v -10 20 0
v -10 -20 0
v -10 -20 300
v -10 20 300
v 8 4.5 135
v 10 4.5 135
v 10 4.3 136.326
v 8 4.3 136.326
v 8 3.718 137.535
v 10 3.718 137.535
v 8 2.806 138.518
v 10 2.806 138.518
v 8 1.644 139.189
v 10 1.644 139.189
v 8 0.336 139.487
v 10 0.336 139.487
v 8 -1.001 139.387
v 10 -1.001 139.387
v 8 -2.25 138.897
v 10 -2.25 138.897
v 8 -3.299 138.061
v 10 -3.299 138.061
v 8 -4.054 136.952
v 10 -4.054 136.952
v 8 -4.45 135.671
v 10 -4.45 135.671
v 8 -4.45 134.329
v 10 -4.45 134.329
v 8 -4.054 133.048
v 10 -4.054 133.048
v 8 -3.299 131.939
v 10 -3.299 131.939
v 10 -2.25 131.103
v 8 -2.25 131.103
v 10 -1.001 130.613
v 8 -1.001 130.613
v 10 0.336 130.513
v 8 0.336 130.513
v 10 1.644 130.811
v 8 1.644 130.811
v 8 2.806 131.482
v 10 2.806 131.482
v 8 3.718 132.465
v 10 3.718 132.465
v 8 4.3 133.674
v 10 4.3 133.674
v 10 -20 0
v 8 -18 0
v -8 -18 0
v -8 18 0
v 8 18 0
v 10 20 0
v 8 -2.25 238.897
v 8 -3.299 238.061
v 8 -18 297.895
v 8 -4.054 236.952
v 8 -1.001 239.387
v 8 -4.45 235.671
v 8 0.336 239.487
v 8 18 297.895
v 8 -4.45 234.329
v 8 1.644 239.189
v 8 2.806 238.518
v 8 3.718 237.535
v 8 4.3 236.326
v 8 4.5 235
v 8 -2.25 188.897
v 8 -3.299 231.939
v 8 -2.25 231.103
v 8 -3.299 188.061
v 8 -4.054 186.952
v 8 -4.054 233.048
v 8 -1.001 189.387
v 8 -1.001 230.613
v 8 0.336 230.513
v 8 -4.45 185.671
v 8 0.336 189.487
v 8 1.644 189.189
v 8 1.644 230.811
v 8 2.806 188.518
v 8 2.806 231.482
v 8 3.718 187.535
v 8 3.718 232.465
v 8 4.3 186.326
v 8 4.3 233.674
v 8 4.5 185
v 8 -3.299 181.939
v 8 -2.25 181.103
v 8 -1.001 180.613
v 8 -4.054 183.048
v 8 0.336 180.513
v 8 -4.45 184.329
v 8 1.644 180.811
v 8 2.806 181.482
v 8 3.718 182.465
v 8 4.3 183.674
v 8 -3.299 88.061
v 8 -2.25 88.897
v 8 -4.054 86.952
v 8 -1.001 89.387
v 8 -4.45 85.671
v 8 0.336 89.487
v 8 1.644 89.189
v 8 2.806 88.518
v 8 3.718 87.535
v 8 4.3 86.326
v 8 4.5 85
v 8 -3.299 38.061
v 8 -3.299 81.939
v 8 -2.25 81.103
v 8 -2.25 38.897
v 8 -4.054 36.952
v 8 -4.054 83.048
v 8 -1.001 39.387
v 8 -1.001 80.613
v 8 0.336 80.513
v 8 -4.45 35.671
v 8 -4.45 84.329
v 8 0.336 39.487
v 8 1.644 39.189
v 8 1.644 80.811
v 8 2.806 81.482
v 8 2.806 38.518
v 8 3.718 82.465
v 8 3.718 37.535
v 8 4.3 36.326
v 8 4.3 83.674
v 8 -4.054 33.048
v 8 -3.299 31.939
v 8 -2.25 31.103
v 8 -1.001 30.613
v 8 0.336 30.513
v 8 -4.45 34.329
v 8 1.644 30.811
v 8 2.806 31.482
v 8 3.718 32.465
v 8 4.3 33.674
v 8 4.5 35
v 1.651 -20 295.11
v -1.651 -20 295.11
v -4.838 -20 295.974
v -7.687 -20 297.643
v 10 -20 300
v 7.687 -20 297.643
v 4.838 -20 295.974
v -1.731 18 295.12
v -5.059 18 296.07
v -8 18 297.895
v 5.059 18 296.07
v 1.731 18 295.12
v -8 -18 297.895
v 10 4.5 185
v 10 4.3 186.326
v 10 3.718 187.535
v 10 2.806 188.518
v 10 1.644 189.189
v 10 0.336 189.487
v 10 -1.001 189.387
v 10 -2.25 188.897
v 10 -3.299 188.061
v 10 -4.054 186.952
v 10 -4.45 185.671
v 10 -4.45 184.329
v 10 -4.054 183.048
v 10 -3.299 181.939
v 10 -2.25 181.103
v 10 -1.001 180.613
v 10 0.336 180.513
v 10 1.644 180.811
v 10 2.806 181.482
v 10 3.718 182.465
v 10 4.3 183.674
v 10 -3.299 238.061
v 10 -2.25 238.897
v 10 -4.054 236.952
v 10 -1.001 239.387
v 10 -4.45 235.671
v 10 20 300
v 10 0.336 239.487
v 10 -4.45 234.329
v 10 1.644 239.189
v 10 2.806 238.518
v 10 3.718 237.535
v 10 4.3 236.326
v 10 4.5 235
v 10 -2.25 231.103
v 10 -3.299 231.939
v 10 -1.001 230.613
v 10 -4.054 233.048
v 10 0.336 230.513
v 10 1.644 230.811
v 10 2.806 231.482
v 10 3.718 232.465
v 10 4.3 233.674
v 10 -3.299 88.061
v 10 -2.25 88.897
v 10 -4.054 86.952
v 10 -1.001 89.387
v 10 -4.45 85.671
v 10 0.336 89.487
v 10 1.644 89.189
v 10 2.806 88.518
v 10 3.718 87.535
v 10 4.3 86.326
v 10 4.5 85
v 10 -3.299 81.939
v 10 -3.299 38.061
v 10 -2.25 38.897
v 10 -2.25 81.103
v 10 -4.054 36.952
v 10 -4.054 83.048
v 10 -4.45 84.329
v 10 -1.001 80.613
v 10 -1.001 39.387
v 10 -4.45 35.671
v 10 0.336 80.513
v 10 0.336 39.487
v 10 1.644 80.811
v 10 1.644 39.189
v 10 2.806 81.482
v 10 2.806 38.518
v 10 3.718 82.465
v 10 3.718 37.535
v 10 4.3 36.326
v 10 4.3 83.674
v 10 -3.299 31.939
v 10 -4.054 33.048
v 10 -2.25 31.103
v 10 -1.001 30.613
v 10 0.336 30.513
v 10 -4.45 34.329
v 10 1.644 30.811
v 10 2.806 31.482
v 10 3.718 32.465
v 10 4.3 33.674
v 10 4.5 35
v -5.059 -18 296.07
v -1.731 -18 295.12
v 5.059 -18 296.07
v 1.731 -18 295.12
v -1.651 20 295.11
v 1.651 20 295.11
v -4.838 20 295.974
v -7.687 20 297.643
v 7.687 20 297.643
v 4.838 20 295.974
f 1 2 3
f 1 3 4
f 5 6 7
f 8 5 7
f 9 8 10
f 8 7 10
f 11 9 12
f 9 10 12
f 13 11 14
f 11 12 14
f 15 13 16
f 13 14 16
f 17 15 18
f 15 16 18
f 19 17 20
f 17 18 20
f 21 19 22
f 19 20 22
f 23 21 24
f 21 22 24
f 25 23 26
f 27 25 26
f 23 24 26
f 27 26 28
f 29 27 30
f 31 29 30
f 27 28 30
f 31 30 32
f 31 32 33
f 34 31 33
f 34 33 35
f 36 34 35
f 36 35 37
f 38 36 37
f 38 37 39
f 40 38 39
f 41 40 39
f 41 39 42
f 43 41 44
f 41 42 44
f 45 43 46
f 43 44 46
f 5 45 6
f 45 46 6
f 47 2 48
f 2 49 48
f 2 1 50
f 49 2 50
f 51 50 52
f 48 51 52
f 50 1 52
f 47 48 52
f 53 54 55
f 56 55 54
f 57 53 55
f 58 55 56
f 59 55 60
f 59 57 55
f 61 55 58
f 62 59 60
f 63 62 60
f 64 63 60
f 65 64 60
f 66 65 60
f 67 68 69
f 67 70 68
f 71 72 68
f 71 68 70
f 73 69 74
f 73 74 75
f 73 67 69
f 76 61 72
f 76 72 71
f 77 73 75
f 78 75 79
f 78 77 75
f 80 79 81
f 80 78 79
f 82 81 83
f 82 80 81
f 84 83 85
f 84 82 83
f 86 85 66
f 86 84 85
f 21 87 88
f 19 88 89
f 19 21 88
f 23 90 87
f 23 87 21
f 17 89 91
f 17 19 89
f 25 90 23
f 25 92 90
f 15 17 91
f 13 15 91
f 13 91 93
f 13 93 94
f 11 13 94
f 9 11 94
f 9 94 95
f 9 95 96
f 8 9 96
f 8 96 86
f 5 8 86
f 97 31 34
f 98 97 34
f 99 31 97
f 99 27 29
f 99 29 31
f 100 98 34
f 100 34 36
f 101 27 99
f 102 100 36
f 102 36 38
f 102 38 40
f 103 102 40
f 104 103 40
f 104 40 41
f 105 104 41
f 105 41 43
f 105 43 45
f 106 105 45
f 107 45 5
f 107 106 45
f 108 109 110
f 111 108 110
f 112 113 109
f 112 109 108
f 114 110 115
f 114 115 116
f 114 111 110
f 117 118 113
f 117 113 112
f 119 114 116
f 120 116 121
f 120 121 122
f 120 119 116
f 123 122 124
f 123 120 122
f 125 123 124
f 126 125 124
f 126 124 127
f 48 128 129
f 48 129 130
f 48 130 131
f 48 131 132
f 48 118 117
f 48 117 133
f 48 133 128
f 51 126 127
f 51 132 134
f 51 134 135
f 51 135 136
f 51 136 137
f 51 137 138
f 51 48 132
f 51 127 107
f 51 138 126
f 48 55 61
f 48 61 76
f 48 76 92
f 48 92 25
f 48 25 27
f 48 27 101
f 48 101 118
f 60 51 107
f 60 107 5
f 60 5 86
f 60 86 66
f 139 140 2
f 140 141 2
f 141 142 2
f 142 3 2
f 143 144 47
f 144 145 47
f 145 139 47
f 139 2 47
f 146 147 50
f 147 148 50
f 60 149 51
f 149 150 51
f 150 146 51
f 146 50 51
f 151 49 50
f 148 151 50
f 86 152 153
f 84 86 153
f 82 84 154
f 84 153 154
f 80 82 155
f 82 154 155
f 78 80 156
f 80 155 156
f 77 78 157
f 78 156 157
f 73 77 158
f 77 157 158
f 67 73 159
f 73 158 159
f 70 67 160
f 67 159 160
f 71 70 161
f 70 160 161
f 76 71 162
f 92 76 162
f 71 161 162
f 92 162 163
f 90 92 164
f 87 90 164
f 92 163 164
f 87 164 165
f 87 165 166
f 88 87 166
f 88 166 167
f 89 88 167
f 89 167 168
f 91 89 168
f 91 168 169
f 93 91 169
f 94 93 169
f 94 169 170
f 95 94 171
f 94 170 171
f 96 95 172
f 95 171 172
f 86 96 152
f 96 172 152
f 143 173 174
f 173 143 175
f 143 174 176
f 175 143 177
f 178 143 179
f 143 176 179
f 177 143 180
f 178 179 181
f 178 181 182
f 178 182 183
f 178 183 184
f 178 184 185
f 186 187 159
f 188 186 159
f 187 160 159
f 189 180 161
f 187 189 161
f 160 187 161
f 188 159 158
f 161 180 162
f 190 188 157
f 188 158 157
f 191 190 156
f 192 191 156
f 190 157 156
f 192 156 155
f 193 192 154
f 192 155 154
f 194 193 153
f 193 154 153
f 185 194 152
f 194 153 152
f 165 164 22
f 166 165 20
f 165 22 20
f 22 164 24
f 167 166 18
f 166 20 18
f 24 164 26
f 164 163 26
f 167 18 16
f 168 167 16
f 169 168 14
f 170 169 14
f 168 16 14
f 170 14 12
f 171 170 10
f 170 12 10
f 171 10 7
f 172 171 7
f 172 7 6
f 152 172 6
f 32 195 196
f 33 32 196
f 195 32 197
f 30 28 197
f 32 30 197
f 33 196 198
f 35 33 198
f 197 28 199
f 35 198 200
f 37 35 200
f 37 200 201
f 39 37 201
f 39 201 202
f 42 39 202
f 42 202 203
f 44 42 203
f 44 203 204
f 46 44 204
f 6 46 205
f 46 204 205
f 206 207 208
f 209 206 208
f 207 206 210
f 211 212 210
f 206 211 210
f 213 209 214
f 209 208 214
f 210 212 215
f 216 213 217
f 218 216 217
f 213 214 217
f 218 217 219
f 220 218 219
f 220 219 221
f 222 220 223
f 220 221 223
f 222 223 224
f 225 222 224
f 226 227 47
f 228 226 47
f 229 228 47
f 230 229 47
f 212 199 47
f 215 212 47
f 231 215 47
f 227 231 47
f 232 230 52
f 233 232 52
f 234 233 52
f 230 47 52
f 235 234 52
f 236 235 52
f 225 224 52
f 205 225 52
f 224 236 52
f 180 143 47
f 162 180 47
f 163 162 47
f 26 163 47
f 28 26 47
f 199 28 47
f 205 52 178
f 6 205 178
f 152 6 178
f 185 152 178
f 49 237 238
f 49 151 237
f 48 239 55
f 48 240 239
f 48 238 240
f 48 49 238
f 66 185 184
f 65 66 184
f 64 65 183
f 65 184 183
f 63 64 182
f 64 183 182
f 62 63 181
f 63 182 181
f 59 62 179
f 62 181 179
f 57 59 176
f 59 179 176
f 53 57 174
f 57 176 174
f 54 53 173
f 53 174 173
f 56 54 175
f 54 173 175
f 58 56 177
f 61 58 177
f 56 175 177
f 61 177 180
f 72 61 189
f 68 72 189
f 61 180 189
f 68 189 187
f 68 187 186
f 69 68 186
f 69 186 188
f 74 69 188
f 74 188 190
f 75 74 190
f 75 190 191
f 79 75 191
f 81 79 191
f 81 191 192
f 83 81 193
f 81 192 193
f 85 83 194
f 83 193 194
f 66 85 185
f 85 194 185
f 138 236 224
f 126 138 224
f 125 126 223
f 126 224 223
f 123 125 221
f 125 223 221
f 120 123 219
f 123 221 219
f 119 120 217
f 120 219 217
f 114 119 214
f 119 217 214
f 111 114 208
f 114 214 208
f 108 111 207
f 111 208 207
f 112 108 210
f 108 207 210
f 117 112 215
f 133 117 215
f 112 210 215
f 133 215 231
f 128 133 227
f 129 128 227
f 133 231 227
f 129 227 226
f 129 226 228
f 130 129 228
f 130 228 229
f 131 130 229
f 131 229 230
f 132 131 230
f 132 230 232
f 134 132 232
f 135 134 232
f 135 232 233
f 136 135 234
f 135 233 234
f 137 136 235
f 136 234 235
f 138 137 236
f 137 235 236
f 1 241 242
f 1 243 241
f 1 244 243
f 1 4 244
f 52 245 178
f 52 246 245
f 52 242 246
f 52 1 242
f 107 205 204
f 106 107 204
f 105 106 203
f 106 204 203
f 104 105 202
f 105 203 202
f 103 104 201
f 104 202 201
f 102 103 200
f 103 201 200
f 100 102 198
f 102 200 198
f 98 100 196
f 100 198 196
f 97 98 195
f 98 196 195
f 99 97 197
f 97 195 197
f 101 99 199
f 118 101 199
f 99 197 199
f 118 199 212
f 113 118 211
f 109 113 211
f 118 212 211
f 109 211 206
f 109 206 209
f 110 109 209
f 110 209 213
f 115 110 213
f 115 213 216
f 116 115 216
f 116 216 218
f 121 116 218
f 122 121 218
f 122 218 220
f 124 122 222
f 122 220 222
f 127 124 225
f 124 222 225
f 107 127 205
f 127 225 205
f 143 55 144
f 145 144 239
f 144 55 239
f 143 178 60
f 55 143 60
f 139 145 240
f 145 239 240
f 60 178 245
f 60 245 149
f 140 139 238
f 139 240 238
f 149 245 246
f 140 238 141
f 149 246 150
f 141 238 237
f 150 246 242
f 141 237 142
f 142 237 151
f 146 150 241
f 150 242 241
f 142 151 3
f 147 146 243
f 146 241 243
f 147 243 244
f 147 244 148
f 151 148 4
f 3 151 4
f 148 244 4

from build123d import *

# Parameters (mm, degrees)
SKETCH_1_W          = 20
SKETCH_1_H          = 40
SKETCH_1_W_2        = 16
SKETCH_1_H_2        = 36
EXTRUDE_1_DEPTH     = 300
SKETCH_2_R          = 12.5
CUT_EXTRUDE_1_DEPTH = 40
SKETCH_3_R          = 4.5
CUT_EXTRUDE_2_DEPTH = 2


with BuildPart() as part:
    # Эскиз1 → Бобышка-Вытянуть1 (new body)
    with BuildSketch(Plane.XY):
        Rectangle(SKETCH_1_W, SKETCH_1_H)
        Rectangle(SKETCH_1_W_2, SKETCH_1_H_2, mode=Mode.SUBTRACT)
    extrude(amount=EXTRUDE_1_DEPTH)

    # Эскиз2 → Вырез-Вытянуть1 (cut)
    with BuildSketch(Plane(origin=(0, 20, 0), x_dir=(1, 0, 0), z_dir=(0, 1, 0))):
        with Locations((0, -307.5)):
            Circle(SKETCH_2_R)
    extrude(amount=-CUT_EXTRUDE_1_DEPTH, mode=Mode.SUBTRACT)

    # Эскиз3 → Вырез-Вытянуть2 (cut)
    with BuildSketch(Plane(origin=(10, 0, 0), x_dir=(0, 0, -1), z_dir=(1, 0, 0))):
        with Locations(Location((-35, 0, 0), (0, 0, 90))):  # turned: the seam where the file's is
            Circle(SKETCH_3_R)
        with Locations(Location((-85, 0, 0), (0, 0, 90))):  # turned: the seam where the file's is
            Circle(SKETCH_3_R)
        with Locations(Location((-135, 0, 0), (0, 0, 90))):  # turned: the seam where the file's is
            Circle(SKETCH_3_R)
        with Locations(Location((-185, 0, 0), (0, 0, 90))):  # turned: the seam where the file's is
            Circle(SKETCH_3_R)
        with Locations(Location((-235, 0, 0), (0, 0, 90))):  # turned: the seam where the file's is
            Circle(SKETCH_3_R)
    extrude(amount=-CUT_EXTRUDE_2_DEPTH, mode=Mode.SUBTRACT)


solid = part.part
